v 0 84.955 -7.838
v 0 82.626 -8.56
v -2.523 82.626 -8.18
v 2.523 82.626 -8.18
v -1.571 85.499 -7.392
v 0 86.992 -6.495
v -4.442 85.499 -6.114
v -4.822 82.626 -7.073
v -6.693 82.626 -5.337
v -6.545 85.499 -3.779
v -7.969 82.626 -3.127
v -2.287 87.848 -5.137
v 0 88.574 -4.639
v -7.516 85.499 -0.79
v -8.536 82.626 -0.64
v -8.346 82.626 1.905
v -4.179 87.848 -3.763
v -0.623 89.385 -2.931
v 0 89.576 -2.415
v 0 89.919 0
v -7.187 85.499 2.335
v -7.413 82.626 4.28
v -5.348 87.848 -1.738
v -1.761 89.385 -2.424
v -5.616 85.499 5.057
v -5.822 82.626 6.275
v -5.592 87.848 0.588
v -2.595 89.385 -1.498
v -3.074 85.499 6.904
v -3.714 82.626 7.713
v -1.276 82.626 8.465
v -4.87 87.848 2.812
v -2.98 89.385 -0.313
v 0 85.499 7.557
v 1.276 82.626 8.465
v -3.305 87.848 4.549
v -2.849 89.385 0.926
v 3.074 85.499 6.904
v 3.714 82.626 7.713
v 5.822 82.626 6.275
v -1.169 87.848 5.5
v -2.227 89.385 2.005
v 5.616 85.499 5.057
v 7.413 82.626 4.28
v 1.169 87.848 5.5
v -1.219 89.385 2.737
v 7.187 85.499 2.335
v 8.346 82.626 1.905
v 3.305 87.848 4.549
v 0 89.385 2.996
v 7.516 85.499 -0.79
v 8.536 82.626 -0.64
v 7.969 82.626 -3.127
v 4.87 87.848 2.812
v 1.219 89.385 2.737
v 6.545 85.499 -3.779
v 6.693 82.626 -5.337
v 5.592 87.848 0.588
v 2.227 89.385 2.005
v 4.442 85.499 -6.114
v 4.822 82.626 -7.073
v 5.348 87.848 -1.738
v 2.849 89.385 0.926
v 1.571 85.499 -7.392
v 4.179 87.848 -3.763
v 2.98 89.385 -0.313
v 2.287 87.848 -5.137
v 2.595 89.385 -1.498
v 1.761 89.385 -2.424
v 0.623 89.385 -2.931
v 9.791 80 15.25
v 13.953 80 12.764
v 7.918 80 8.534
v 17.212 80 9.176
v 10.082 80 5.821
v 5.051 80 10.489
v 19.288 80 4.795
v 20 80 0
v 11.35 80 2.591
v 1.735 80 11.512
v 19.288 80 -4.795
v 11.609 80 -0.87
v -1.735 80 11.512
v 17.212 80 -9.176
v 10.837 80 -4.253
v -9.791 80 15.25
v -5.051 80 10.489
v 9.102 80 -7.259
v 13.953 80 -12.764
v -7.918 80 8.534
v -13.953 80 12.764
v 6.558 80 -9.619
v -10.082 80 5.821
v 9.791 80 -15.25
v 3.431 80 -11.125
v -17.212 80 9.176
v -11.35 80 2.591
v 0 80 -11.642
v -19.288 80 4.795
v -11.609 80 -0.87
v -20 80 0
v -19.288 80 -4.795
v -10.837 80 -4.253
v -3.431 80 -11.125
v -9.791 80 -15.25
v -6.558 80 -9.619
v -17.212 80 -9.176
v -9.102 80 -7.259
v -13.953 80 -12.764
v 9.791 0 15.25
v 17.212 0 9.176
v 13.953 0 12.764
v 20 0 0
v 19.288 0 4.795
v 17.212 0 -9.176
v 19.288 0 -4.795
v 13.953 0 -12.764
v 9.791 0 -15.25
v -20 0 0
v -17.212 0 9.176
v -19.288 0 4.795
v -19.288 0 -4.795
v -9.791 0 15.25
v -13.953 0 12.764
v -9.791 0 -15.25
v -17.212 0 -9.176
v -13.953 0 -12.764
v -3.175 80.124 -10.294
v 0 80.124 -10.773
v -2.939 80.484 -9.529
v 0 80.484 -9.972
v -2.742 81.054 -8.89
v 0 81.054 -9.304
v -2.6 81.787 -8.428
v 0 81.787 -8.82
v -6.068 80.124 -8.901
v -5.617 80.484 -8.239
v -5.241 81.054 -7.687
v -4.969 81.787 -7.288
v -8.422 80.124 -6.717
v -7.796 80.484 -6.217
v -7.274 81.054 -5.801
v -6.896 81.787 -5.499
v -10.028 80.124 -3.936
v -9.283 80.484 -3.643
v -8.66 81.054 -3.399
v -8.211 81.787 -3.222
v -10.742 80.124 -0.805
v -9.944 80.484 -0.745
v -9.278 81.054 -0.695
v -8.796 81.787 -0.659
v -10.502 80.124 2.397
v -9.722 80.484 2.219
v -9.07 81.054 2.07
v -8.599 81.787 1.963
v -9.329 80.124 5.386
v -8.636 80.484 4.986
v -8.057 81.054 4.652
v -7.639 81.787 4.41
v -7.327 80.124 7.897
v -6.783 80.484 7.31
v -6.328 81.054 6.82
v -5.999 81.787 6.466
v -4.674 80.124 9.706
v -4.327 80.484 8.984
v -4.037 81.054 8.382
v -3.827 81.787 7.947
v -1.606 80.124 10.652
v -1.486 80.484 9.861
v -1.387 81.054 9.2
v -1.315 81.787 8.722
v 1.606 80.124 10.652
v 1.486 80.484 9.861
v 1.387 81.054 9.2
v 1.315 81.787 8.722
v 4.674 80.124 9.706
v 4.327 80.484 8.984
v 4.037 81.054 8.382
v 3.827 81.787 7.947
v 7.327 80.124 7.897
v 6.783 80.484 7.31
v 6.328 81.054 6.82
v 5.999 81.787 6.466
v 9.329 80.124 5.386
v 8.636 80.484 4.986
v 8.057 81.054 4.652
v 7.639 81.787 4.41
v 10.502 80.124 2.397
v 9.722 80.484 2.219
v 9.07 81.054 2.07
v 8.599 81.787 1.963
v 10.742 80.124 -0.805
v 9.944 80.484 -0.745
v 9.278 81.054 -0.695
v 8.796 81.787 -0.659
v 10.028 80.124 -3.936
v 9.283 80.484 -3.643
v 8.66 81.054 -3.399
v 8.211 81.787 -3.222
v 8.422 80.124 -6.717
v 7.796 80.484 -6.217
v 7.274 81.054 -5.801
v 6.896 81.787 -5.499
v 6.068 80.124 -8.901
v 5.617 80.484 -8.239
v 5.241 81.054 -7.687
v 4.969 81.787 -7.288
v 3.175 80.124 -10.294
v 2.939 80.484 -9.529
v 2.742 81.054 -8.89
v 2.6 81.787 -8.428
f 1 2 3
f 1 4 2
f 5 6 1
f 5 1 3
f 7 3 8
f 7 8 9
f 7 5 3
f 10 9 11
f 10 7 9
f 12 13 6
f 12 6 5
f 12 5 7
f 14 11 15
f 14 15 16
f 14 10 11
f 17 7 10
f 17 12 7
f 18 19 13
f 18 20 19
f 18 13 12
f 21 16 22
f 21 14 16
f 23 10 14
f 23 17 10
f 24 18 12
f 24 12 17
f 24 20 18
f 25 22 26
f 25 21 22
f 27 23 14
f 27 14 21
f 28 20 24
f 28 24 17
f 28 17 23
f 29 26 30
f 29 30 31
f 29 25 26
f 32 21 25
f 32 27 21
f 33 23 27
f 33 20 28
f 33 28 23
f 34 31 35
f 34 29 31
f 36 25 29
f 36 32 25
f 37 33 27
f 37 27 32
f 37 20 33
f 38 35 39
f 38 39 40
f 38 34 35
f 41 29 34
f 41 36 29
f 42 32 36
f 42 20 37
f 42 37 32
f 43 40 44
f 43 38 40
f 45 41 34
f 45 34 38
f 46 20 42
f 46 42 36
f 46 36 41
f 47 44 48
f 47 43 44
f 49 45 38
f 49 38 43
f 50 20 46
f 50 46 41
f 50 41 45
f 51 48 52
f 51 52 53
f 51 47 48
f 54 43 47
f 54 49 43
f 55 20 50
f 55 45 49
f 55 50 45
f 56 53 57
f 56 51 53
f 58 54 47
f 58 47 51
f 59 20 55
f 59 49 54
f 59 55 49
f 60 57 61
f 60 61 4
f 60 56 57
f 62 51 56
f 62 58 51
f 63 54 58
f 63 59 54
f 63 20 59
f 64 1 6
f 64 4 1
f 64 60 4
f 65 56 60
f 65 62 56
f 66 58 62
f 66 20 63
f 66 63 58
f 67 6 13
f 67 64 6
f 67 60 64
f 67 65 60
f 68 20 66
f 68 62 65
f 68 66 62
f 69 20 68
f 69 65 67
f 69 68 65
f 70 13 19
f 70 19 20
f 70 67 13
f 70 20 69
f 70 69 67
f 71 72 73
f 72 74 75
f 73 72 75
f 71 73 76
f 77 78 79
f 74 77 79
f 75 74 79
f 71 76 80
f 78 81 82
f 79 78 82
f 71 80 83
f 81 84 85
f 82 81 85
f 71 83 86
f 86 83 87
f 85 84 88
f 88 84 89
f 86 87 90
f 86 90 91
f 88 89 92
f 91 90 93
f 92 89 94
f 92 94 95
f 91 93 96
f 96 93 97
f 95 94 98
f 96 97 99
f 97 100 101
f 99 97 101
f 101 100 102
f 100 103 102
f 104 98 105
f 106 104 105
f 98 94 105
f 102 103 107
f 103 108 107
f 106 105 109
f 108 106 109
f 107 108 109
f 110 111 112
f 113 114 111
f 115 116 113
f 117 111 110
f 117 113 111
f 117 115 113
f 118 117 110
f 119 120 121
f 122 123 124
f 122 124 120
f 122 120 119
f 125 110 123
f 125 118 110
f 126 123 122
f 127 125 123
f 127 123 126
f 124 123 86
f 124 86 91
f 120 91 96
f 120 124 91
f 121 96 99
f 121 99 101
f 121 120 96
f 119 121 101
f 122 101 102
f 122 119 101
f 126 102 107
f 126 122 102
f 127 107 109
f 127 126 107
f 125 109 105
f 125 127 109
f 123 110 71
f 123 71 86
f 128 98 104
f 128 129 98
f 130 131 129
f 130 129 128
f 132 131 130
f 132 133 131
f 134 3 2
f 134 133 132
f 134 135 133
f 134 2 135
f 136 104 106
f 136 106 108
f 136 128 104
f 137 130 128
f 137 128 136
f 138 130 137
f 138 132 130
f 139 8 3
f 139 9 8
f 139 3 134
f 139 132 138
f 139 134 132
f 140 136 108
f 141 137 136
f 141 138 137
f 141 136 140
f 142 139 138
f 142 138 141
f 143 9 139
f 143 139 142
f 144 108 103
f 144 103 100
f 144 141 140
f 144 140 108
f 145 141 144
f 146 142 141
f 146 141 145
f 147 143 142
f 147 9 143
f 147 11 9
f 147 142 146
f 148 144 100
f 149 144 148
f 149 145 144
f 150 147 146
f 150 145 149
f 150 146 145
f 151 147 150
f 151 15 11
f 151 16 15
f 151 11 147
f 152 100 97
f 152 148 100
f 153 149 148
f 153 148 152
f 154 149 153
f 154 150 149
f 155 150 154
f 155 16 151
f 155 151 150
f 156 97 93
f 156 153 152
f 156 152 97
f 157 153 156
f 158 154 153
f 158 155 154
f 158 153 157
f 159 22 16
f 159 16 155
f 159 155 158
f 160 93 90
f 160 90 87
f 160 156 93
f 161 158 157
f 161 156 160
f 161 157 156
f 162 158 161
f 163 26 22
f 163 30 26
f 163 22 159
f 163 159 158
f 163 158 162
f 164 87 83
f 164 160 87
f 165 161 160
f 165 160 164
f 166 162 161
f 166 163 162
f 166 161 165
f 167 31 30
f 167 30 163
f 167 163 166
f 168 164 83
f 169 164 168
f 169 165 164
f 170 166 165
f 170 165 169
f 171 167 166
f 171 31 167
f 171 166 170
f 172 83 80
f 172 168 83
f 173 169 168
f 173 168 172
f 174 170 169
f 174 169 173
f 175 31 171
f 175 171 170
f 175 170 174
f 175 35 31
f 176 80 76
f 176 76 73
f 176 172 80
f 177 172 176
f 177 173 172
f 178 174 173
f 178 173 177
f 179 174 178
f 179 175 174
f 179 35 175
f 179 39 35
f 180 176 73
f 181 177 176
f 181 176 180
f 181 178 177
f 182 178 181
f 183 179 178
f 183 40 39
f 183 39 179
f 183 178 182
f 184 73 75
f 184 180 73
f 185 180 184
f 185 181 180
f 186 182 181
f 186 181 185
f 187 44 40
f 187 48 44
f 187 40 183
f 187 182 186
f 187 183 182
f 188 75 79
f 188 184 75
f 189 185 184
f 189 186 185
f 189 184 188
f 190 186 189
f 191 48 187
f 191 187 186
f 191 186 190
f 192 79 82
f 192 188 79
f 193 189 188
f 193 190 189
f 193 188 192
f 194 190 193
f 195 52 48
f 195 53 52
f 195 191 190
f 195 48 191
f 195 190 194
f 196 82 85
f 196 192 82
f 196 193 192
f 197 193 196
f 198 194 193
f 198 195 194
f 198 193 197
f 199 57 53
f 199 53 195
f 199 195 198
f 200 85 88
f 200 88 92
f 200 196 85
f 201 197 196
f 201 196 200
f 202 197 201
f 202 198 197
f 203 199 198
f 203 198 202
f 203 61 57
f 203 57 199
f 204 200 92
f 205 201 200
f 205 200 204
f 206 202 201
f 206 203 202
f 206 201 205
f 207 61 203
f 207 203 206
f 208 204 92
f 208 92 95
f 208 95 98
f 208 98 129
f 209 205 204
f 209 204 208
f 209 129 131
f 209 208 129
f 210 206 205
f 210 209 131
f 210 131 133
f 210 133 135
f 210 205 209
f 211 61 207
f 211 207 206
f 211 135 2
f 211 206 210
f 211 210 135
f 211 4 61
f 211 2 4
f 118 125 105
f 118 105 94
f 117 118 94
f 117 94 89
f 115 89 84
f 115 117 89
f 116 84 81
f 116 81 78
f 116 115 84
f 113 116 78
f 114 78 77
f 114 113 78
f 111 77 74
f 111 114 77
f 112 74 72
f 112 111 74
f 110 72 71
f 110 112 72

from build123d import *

# Parameters (mm, degrees)
BOSS_EXTRUDE1_DEPTH = 80


with BuildPart() as part:
    # Sketch1 → Boss-Extrude1 (new body)
    with BuildSketch(Plane(origin=(0, 0, 0), x_dir=(1, 0, 0), z_dir=(0, 1, 0))):
        with BuildLine():
            Line((-9.791248996, 15.25), (9.791248996, 15.25))
            ThreePointArc((9.791248996, 15.25), (20, 0), (9.791248996, -15.25))
            Line((9.791248996, -15.25), (-9.791248996, -15.25))
            ThreePointArc((-9.791248996, -15.25), (-20, 0), (-9.791248996, 15.25))
        make_face()
    extrude(amount=BOSS_EXTRUDE1_DEPTH)

    # Sketch4 → Revolve1 (revolve)
    with BuildSketch(Plane(origin=(0, 0, 0), x_dir=(0, 0, -1), z_dir=(1, 0, 0))):
        with BuildLine():
            Line((0, 80), (11.641855063, 80))
            ThreePointArc((11.641855063, 80), (9.61766545, 80.745389743), (8.560304848, 82.625532826))
            ThreePointArc((8.560304848, 82.625532826), (5.623040011, 87.848422876), (0, 89.919057131))
            Line((0, 89.919057131), (0, 80))
        make_face()
    revolve(axis=Axis((0, 80, 0), (0, 1, 0)))


solid = part.part
